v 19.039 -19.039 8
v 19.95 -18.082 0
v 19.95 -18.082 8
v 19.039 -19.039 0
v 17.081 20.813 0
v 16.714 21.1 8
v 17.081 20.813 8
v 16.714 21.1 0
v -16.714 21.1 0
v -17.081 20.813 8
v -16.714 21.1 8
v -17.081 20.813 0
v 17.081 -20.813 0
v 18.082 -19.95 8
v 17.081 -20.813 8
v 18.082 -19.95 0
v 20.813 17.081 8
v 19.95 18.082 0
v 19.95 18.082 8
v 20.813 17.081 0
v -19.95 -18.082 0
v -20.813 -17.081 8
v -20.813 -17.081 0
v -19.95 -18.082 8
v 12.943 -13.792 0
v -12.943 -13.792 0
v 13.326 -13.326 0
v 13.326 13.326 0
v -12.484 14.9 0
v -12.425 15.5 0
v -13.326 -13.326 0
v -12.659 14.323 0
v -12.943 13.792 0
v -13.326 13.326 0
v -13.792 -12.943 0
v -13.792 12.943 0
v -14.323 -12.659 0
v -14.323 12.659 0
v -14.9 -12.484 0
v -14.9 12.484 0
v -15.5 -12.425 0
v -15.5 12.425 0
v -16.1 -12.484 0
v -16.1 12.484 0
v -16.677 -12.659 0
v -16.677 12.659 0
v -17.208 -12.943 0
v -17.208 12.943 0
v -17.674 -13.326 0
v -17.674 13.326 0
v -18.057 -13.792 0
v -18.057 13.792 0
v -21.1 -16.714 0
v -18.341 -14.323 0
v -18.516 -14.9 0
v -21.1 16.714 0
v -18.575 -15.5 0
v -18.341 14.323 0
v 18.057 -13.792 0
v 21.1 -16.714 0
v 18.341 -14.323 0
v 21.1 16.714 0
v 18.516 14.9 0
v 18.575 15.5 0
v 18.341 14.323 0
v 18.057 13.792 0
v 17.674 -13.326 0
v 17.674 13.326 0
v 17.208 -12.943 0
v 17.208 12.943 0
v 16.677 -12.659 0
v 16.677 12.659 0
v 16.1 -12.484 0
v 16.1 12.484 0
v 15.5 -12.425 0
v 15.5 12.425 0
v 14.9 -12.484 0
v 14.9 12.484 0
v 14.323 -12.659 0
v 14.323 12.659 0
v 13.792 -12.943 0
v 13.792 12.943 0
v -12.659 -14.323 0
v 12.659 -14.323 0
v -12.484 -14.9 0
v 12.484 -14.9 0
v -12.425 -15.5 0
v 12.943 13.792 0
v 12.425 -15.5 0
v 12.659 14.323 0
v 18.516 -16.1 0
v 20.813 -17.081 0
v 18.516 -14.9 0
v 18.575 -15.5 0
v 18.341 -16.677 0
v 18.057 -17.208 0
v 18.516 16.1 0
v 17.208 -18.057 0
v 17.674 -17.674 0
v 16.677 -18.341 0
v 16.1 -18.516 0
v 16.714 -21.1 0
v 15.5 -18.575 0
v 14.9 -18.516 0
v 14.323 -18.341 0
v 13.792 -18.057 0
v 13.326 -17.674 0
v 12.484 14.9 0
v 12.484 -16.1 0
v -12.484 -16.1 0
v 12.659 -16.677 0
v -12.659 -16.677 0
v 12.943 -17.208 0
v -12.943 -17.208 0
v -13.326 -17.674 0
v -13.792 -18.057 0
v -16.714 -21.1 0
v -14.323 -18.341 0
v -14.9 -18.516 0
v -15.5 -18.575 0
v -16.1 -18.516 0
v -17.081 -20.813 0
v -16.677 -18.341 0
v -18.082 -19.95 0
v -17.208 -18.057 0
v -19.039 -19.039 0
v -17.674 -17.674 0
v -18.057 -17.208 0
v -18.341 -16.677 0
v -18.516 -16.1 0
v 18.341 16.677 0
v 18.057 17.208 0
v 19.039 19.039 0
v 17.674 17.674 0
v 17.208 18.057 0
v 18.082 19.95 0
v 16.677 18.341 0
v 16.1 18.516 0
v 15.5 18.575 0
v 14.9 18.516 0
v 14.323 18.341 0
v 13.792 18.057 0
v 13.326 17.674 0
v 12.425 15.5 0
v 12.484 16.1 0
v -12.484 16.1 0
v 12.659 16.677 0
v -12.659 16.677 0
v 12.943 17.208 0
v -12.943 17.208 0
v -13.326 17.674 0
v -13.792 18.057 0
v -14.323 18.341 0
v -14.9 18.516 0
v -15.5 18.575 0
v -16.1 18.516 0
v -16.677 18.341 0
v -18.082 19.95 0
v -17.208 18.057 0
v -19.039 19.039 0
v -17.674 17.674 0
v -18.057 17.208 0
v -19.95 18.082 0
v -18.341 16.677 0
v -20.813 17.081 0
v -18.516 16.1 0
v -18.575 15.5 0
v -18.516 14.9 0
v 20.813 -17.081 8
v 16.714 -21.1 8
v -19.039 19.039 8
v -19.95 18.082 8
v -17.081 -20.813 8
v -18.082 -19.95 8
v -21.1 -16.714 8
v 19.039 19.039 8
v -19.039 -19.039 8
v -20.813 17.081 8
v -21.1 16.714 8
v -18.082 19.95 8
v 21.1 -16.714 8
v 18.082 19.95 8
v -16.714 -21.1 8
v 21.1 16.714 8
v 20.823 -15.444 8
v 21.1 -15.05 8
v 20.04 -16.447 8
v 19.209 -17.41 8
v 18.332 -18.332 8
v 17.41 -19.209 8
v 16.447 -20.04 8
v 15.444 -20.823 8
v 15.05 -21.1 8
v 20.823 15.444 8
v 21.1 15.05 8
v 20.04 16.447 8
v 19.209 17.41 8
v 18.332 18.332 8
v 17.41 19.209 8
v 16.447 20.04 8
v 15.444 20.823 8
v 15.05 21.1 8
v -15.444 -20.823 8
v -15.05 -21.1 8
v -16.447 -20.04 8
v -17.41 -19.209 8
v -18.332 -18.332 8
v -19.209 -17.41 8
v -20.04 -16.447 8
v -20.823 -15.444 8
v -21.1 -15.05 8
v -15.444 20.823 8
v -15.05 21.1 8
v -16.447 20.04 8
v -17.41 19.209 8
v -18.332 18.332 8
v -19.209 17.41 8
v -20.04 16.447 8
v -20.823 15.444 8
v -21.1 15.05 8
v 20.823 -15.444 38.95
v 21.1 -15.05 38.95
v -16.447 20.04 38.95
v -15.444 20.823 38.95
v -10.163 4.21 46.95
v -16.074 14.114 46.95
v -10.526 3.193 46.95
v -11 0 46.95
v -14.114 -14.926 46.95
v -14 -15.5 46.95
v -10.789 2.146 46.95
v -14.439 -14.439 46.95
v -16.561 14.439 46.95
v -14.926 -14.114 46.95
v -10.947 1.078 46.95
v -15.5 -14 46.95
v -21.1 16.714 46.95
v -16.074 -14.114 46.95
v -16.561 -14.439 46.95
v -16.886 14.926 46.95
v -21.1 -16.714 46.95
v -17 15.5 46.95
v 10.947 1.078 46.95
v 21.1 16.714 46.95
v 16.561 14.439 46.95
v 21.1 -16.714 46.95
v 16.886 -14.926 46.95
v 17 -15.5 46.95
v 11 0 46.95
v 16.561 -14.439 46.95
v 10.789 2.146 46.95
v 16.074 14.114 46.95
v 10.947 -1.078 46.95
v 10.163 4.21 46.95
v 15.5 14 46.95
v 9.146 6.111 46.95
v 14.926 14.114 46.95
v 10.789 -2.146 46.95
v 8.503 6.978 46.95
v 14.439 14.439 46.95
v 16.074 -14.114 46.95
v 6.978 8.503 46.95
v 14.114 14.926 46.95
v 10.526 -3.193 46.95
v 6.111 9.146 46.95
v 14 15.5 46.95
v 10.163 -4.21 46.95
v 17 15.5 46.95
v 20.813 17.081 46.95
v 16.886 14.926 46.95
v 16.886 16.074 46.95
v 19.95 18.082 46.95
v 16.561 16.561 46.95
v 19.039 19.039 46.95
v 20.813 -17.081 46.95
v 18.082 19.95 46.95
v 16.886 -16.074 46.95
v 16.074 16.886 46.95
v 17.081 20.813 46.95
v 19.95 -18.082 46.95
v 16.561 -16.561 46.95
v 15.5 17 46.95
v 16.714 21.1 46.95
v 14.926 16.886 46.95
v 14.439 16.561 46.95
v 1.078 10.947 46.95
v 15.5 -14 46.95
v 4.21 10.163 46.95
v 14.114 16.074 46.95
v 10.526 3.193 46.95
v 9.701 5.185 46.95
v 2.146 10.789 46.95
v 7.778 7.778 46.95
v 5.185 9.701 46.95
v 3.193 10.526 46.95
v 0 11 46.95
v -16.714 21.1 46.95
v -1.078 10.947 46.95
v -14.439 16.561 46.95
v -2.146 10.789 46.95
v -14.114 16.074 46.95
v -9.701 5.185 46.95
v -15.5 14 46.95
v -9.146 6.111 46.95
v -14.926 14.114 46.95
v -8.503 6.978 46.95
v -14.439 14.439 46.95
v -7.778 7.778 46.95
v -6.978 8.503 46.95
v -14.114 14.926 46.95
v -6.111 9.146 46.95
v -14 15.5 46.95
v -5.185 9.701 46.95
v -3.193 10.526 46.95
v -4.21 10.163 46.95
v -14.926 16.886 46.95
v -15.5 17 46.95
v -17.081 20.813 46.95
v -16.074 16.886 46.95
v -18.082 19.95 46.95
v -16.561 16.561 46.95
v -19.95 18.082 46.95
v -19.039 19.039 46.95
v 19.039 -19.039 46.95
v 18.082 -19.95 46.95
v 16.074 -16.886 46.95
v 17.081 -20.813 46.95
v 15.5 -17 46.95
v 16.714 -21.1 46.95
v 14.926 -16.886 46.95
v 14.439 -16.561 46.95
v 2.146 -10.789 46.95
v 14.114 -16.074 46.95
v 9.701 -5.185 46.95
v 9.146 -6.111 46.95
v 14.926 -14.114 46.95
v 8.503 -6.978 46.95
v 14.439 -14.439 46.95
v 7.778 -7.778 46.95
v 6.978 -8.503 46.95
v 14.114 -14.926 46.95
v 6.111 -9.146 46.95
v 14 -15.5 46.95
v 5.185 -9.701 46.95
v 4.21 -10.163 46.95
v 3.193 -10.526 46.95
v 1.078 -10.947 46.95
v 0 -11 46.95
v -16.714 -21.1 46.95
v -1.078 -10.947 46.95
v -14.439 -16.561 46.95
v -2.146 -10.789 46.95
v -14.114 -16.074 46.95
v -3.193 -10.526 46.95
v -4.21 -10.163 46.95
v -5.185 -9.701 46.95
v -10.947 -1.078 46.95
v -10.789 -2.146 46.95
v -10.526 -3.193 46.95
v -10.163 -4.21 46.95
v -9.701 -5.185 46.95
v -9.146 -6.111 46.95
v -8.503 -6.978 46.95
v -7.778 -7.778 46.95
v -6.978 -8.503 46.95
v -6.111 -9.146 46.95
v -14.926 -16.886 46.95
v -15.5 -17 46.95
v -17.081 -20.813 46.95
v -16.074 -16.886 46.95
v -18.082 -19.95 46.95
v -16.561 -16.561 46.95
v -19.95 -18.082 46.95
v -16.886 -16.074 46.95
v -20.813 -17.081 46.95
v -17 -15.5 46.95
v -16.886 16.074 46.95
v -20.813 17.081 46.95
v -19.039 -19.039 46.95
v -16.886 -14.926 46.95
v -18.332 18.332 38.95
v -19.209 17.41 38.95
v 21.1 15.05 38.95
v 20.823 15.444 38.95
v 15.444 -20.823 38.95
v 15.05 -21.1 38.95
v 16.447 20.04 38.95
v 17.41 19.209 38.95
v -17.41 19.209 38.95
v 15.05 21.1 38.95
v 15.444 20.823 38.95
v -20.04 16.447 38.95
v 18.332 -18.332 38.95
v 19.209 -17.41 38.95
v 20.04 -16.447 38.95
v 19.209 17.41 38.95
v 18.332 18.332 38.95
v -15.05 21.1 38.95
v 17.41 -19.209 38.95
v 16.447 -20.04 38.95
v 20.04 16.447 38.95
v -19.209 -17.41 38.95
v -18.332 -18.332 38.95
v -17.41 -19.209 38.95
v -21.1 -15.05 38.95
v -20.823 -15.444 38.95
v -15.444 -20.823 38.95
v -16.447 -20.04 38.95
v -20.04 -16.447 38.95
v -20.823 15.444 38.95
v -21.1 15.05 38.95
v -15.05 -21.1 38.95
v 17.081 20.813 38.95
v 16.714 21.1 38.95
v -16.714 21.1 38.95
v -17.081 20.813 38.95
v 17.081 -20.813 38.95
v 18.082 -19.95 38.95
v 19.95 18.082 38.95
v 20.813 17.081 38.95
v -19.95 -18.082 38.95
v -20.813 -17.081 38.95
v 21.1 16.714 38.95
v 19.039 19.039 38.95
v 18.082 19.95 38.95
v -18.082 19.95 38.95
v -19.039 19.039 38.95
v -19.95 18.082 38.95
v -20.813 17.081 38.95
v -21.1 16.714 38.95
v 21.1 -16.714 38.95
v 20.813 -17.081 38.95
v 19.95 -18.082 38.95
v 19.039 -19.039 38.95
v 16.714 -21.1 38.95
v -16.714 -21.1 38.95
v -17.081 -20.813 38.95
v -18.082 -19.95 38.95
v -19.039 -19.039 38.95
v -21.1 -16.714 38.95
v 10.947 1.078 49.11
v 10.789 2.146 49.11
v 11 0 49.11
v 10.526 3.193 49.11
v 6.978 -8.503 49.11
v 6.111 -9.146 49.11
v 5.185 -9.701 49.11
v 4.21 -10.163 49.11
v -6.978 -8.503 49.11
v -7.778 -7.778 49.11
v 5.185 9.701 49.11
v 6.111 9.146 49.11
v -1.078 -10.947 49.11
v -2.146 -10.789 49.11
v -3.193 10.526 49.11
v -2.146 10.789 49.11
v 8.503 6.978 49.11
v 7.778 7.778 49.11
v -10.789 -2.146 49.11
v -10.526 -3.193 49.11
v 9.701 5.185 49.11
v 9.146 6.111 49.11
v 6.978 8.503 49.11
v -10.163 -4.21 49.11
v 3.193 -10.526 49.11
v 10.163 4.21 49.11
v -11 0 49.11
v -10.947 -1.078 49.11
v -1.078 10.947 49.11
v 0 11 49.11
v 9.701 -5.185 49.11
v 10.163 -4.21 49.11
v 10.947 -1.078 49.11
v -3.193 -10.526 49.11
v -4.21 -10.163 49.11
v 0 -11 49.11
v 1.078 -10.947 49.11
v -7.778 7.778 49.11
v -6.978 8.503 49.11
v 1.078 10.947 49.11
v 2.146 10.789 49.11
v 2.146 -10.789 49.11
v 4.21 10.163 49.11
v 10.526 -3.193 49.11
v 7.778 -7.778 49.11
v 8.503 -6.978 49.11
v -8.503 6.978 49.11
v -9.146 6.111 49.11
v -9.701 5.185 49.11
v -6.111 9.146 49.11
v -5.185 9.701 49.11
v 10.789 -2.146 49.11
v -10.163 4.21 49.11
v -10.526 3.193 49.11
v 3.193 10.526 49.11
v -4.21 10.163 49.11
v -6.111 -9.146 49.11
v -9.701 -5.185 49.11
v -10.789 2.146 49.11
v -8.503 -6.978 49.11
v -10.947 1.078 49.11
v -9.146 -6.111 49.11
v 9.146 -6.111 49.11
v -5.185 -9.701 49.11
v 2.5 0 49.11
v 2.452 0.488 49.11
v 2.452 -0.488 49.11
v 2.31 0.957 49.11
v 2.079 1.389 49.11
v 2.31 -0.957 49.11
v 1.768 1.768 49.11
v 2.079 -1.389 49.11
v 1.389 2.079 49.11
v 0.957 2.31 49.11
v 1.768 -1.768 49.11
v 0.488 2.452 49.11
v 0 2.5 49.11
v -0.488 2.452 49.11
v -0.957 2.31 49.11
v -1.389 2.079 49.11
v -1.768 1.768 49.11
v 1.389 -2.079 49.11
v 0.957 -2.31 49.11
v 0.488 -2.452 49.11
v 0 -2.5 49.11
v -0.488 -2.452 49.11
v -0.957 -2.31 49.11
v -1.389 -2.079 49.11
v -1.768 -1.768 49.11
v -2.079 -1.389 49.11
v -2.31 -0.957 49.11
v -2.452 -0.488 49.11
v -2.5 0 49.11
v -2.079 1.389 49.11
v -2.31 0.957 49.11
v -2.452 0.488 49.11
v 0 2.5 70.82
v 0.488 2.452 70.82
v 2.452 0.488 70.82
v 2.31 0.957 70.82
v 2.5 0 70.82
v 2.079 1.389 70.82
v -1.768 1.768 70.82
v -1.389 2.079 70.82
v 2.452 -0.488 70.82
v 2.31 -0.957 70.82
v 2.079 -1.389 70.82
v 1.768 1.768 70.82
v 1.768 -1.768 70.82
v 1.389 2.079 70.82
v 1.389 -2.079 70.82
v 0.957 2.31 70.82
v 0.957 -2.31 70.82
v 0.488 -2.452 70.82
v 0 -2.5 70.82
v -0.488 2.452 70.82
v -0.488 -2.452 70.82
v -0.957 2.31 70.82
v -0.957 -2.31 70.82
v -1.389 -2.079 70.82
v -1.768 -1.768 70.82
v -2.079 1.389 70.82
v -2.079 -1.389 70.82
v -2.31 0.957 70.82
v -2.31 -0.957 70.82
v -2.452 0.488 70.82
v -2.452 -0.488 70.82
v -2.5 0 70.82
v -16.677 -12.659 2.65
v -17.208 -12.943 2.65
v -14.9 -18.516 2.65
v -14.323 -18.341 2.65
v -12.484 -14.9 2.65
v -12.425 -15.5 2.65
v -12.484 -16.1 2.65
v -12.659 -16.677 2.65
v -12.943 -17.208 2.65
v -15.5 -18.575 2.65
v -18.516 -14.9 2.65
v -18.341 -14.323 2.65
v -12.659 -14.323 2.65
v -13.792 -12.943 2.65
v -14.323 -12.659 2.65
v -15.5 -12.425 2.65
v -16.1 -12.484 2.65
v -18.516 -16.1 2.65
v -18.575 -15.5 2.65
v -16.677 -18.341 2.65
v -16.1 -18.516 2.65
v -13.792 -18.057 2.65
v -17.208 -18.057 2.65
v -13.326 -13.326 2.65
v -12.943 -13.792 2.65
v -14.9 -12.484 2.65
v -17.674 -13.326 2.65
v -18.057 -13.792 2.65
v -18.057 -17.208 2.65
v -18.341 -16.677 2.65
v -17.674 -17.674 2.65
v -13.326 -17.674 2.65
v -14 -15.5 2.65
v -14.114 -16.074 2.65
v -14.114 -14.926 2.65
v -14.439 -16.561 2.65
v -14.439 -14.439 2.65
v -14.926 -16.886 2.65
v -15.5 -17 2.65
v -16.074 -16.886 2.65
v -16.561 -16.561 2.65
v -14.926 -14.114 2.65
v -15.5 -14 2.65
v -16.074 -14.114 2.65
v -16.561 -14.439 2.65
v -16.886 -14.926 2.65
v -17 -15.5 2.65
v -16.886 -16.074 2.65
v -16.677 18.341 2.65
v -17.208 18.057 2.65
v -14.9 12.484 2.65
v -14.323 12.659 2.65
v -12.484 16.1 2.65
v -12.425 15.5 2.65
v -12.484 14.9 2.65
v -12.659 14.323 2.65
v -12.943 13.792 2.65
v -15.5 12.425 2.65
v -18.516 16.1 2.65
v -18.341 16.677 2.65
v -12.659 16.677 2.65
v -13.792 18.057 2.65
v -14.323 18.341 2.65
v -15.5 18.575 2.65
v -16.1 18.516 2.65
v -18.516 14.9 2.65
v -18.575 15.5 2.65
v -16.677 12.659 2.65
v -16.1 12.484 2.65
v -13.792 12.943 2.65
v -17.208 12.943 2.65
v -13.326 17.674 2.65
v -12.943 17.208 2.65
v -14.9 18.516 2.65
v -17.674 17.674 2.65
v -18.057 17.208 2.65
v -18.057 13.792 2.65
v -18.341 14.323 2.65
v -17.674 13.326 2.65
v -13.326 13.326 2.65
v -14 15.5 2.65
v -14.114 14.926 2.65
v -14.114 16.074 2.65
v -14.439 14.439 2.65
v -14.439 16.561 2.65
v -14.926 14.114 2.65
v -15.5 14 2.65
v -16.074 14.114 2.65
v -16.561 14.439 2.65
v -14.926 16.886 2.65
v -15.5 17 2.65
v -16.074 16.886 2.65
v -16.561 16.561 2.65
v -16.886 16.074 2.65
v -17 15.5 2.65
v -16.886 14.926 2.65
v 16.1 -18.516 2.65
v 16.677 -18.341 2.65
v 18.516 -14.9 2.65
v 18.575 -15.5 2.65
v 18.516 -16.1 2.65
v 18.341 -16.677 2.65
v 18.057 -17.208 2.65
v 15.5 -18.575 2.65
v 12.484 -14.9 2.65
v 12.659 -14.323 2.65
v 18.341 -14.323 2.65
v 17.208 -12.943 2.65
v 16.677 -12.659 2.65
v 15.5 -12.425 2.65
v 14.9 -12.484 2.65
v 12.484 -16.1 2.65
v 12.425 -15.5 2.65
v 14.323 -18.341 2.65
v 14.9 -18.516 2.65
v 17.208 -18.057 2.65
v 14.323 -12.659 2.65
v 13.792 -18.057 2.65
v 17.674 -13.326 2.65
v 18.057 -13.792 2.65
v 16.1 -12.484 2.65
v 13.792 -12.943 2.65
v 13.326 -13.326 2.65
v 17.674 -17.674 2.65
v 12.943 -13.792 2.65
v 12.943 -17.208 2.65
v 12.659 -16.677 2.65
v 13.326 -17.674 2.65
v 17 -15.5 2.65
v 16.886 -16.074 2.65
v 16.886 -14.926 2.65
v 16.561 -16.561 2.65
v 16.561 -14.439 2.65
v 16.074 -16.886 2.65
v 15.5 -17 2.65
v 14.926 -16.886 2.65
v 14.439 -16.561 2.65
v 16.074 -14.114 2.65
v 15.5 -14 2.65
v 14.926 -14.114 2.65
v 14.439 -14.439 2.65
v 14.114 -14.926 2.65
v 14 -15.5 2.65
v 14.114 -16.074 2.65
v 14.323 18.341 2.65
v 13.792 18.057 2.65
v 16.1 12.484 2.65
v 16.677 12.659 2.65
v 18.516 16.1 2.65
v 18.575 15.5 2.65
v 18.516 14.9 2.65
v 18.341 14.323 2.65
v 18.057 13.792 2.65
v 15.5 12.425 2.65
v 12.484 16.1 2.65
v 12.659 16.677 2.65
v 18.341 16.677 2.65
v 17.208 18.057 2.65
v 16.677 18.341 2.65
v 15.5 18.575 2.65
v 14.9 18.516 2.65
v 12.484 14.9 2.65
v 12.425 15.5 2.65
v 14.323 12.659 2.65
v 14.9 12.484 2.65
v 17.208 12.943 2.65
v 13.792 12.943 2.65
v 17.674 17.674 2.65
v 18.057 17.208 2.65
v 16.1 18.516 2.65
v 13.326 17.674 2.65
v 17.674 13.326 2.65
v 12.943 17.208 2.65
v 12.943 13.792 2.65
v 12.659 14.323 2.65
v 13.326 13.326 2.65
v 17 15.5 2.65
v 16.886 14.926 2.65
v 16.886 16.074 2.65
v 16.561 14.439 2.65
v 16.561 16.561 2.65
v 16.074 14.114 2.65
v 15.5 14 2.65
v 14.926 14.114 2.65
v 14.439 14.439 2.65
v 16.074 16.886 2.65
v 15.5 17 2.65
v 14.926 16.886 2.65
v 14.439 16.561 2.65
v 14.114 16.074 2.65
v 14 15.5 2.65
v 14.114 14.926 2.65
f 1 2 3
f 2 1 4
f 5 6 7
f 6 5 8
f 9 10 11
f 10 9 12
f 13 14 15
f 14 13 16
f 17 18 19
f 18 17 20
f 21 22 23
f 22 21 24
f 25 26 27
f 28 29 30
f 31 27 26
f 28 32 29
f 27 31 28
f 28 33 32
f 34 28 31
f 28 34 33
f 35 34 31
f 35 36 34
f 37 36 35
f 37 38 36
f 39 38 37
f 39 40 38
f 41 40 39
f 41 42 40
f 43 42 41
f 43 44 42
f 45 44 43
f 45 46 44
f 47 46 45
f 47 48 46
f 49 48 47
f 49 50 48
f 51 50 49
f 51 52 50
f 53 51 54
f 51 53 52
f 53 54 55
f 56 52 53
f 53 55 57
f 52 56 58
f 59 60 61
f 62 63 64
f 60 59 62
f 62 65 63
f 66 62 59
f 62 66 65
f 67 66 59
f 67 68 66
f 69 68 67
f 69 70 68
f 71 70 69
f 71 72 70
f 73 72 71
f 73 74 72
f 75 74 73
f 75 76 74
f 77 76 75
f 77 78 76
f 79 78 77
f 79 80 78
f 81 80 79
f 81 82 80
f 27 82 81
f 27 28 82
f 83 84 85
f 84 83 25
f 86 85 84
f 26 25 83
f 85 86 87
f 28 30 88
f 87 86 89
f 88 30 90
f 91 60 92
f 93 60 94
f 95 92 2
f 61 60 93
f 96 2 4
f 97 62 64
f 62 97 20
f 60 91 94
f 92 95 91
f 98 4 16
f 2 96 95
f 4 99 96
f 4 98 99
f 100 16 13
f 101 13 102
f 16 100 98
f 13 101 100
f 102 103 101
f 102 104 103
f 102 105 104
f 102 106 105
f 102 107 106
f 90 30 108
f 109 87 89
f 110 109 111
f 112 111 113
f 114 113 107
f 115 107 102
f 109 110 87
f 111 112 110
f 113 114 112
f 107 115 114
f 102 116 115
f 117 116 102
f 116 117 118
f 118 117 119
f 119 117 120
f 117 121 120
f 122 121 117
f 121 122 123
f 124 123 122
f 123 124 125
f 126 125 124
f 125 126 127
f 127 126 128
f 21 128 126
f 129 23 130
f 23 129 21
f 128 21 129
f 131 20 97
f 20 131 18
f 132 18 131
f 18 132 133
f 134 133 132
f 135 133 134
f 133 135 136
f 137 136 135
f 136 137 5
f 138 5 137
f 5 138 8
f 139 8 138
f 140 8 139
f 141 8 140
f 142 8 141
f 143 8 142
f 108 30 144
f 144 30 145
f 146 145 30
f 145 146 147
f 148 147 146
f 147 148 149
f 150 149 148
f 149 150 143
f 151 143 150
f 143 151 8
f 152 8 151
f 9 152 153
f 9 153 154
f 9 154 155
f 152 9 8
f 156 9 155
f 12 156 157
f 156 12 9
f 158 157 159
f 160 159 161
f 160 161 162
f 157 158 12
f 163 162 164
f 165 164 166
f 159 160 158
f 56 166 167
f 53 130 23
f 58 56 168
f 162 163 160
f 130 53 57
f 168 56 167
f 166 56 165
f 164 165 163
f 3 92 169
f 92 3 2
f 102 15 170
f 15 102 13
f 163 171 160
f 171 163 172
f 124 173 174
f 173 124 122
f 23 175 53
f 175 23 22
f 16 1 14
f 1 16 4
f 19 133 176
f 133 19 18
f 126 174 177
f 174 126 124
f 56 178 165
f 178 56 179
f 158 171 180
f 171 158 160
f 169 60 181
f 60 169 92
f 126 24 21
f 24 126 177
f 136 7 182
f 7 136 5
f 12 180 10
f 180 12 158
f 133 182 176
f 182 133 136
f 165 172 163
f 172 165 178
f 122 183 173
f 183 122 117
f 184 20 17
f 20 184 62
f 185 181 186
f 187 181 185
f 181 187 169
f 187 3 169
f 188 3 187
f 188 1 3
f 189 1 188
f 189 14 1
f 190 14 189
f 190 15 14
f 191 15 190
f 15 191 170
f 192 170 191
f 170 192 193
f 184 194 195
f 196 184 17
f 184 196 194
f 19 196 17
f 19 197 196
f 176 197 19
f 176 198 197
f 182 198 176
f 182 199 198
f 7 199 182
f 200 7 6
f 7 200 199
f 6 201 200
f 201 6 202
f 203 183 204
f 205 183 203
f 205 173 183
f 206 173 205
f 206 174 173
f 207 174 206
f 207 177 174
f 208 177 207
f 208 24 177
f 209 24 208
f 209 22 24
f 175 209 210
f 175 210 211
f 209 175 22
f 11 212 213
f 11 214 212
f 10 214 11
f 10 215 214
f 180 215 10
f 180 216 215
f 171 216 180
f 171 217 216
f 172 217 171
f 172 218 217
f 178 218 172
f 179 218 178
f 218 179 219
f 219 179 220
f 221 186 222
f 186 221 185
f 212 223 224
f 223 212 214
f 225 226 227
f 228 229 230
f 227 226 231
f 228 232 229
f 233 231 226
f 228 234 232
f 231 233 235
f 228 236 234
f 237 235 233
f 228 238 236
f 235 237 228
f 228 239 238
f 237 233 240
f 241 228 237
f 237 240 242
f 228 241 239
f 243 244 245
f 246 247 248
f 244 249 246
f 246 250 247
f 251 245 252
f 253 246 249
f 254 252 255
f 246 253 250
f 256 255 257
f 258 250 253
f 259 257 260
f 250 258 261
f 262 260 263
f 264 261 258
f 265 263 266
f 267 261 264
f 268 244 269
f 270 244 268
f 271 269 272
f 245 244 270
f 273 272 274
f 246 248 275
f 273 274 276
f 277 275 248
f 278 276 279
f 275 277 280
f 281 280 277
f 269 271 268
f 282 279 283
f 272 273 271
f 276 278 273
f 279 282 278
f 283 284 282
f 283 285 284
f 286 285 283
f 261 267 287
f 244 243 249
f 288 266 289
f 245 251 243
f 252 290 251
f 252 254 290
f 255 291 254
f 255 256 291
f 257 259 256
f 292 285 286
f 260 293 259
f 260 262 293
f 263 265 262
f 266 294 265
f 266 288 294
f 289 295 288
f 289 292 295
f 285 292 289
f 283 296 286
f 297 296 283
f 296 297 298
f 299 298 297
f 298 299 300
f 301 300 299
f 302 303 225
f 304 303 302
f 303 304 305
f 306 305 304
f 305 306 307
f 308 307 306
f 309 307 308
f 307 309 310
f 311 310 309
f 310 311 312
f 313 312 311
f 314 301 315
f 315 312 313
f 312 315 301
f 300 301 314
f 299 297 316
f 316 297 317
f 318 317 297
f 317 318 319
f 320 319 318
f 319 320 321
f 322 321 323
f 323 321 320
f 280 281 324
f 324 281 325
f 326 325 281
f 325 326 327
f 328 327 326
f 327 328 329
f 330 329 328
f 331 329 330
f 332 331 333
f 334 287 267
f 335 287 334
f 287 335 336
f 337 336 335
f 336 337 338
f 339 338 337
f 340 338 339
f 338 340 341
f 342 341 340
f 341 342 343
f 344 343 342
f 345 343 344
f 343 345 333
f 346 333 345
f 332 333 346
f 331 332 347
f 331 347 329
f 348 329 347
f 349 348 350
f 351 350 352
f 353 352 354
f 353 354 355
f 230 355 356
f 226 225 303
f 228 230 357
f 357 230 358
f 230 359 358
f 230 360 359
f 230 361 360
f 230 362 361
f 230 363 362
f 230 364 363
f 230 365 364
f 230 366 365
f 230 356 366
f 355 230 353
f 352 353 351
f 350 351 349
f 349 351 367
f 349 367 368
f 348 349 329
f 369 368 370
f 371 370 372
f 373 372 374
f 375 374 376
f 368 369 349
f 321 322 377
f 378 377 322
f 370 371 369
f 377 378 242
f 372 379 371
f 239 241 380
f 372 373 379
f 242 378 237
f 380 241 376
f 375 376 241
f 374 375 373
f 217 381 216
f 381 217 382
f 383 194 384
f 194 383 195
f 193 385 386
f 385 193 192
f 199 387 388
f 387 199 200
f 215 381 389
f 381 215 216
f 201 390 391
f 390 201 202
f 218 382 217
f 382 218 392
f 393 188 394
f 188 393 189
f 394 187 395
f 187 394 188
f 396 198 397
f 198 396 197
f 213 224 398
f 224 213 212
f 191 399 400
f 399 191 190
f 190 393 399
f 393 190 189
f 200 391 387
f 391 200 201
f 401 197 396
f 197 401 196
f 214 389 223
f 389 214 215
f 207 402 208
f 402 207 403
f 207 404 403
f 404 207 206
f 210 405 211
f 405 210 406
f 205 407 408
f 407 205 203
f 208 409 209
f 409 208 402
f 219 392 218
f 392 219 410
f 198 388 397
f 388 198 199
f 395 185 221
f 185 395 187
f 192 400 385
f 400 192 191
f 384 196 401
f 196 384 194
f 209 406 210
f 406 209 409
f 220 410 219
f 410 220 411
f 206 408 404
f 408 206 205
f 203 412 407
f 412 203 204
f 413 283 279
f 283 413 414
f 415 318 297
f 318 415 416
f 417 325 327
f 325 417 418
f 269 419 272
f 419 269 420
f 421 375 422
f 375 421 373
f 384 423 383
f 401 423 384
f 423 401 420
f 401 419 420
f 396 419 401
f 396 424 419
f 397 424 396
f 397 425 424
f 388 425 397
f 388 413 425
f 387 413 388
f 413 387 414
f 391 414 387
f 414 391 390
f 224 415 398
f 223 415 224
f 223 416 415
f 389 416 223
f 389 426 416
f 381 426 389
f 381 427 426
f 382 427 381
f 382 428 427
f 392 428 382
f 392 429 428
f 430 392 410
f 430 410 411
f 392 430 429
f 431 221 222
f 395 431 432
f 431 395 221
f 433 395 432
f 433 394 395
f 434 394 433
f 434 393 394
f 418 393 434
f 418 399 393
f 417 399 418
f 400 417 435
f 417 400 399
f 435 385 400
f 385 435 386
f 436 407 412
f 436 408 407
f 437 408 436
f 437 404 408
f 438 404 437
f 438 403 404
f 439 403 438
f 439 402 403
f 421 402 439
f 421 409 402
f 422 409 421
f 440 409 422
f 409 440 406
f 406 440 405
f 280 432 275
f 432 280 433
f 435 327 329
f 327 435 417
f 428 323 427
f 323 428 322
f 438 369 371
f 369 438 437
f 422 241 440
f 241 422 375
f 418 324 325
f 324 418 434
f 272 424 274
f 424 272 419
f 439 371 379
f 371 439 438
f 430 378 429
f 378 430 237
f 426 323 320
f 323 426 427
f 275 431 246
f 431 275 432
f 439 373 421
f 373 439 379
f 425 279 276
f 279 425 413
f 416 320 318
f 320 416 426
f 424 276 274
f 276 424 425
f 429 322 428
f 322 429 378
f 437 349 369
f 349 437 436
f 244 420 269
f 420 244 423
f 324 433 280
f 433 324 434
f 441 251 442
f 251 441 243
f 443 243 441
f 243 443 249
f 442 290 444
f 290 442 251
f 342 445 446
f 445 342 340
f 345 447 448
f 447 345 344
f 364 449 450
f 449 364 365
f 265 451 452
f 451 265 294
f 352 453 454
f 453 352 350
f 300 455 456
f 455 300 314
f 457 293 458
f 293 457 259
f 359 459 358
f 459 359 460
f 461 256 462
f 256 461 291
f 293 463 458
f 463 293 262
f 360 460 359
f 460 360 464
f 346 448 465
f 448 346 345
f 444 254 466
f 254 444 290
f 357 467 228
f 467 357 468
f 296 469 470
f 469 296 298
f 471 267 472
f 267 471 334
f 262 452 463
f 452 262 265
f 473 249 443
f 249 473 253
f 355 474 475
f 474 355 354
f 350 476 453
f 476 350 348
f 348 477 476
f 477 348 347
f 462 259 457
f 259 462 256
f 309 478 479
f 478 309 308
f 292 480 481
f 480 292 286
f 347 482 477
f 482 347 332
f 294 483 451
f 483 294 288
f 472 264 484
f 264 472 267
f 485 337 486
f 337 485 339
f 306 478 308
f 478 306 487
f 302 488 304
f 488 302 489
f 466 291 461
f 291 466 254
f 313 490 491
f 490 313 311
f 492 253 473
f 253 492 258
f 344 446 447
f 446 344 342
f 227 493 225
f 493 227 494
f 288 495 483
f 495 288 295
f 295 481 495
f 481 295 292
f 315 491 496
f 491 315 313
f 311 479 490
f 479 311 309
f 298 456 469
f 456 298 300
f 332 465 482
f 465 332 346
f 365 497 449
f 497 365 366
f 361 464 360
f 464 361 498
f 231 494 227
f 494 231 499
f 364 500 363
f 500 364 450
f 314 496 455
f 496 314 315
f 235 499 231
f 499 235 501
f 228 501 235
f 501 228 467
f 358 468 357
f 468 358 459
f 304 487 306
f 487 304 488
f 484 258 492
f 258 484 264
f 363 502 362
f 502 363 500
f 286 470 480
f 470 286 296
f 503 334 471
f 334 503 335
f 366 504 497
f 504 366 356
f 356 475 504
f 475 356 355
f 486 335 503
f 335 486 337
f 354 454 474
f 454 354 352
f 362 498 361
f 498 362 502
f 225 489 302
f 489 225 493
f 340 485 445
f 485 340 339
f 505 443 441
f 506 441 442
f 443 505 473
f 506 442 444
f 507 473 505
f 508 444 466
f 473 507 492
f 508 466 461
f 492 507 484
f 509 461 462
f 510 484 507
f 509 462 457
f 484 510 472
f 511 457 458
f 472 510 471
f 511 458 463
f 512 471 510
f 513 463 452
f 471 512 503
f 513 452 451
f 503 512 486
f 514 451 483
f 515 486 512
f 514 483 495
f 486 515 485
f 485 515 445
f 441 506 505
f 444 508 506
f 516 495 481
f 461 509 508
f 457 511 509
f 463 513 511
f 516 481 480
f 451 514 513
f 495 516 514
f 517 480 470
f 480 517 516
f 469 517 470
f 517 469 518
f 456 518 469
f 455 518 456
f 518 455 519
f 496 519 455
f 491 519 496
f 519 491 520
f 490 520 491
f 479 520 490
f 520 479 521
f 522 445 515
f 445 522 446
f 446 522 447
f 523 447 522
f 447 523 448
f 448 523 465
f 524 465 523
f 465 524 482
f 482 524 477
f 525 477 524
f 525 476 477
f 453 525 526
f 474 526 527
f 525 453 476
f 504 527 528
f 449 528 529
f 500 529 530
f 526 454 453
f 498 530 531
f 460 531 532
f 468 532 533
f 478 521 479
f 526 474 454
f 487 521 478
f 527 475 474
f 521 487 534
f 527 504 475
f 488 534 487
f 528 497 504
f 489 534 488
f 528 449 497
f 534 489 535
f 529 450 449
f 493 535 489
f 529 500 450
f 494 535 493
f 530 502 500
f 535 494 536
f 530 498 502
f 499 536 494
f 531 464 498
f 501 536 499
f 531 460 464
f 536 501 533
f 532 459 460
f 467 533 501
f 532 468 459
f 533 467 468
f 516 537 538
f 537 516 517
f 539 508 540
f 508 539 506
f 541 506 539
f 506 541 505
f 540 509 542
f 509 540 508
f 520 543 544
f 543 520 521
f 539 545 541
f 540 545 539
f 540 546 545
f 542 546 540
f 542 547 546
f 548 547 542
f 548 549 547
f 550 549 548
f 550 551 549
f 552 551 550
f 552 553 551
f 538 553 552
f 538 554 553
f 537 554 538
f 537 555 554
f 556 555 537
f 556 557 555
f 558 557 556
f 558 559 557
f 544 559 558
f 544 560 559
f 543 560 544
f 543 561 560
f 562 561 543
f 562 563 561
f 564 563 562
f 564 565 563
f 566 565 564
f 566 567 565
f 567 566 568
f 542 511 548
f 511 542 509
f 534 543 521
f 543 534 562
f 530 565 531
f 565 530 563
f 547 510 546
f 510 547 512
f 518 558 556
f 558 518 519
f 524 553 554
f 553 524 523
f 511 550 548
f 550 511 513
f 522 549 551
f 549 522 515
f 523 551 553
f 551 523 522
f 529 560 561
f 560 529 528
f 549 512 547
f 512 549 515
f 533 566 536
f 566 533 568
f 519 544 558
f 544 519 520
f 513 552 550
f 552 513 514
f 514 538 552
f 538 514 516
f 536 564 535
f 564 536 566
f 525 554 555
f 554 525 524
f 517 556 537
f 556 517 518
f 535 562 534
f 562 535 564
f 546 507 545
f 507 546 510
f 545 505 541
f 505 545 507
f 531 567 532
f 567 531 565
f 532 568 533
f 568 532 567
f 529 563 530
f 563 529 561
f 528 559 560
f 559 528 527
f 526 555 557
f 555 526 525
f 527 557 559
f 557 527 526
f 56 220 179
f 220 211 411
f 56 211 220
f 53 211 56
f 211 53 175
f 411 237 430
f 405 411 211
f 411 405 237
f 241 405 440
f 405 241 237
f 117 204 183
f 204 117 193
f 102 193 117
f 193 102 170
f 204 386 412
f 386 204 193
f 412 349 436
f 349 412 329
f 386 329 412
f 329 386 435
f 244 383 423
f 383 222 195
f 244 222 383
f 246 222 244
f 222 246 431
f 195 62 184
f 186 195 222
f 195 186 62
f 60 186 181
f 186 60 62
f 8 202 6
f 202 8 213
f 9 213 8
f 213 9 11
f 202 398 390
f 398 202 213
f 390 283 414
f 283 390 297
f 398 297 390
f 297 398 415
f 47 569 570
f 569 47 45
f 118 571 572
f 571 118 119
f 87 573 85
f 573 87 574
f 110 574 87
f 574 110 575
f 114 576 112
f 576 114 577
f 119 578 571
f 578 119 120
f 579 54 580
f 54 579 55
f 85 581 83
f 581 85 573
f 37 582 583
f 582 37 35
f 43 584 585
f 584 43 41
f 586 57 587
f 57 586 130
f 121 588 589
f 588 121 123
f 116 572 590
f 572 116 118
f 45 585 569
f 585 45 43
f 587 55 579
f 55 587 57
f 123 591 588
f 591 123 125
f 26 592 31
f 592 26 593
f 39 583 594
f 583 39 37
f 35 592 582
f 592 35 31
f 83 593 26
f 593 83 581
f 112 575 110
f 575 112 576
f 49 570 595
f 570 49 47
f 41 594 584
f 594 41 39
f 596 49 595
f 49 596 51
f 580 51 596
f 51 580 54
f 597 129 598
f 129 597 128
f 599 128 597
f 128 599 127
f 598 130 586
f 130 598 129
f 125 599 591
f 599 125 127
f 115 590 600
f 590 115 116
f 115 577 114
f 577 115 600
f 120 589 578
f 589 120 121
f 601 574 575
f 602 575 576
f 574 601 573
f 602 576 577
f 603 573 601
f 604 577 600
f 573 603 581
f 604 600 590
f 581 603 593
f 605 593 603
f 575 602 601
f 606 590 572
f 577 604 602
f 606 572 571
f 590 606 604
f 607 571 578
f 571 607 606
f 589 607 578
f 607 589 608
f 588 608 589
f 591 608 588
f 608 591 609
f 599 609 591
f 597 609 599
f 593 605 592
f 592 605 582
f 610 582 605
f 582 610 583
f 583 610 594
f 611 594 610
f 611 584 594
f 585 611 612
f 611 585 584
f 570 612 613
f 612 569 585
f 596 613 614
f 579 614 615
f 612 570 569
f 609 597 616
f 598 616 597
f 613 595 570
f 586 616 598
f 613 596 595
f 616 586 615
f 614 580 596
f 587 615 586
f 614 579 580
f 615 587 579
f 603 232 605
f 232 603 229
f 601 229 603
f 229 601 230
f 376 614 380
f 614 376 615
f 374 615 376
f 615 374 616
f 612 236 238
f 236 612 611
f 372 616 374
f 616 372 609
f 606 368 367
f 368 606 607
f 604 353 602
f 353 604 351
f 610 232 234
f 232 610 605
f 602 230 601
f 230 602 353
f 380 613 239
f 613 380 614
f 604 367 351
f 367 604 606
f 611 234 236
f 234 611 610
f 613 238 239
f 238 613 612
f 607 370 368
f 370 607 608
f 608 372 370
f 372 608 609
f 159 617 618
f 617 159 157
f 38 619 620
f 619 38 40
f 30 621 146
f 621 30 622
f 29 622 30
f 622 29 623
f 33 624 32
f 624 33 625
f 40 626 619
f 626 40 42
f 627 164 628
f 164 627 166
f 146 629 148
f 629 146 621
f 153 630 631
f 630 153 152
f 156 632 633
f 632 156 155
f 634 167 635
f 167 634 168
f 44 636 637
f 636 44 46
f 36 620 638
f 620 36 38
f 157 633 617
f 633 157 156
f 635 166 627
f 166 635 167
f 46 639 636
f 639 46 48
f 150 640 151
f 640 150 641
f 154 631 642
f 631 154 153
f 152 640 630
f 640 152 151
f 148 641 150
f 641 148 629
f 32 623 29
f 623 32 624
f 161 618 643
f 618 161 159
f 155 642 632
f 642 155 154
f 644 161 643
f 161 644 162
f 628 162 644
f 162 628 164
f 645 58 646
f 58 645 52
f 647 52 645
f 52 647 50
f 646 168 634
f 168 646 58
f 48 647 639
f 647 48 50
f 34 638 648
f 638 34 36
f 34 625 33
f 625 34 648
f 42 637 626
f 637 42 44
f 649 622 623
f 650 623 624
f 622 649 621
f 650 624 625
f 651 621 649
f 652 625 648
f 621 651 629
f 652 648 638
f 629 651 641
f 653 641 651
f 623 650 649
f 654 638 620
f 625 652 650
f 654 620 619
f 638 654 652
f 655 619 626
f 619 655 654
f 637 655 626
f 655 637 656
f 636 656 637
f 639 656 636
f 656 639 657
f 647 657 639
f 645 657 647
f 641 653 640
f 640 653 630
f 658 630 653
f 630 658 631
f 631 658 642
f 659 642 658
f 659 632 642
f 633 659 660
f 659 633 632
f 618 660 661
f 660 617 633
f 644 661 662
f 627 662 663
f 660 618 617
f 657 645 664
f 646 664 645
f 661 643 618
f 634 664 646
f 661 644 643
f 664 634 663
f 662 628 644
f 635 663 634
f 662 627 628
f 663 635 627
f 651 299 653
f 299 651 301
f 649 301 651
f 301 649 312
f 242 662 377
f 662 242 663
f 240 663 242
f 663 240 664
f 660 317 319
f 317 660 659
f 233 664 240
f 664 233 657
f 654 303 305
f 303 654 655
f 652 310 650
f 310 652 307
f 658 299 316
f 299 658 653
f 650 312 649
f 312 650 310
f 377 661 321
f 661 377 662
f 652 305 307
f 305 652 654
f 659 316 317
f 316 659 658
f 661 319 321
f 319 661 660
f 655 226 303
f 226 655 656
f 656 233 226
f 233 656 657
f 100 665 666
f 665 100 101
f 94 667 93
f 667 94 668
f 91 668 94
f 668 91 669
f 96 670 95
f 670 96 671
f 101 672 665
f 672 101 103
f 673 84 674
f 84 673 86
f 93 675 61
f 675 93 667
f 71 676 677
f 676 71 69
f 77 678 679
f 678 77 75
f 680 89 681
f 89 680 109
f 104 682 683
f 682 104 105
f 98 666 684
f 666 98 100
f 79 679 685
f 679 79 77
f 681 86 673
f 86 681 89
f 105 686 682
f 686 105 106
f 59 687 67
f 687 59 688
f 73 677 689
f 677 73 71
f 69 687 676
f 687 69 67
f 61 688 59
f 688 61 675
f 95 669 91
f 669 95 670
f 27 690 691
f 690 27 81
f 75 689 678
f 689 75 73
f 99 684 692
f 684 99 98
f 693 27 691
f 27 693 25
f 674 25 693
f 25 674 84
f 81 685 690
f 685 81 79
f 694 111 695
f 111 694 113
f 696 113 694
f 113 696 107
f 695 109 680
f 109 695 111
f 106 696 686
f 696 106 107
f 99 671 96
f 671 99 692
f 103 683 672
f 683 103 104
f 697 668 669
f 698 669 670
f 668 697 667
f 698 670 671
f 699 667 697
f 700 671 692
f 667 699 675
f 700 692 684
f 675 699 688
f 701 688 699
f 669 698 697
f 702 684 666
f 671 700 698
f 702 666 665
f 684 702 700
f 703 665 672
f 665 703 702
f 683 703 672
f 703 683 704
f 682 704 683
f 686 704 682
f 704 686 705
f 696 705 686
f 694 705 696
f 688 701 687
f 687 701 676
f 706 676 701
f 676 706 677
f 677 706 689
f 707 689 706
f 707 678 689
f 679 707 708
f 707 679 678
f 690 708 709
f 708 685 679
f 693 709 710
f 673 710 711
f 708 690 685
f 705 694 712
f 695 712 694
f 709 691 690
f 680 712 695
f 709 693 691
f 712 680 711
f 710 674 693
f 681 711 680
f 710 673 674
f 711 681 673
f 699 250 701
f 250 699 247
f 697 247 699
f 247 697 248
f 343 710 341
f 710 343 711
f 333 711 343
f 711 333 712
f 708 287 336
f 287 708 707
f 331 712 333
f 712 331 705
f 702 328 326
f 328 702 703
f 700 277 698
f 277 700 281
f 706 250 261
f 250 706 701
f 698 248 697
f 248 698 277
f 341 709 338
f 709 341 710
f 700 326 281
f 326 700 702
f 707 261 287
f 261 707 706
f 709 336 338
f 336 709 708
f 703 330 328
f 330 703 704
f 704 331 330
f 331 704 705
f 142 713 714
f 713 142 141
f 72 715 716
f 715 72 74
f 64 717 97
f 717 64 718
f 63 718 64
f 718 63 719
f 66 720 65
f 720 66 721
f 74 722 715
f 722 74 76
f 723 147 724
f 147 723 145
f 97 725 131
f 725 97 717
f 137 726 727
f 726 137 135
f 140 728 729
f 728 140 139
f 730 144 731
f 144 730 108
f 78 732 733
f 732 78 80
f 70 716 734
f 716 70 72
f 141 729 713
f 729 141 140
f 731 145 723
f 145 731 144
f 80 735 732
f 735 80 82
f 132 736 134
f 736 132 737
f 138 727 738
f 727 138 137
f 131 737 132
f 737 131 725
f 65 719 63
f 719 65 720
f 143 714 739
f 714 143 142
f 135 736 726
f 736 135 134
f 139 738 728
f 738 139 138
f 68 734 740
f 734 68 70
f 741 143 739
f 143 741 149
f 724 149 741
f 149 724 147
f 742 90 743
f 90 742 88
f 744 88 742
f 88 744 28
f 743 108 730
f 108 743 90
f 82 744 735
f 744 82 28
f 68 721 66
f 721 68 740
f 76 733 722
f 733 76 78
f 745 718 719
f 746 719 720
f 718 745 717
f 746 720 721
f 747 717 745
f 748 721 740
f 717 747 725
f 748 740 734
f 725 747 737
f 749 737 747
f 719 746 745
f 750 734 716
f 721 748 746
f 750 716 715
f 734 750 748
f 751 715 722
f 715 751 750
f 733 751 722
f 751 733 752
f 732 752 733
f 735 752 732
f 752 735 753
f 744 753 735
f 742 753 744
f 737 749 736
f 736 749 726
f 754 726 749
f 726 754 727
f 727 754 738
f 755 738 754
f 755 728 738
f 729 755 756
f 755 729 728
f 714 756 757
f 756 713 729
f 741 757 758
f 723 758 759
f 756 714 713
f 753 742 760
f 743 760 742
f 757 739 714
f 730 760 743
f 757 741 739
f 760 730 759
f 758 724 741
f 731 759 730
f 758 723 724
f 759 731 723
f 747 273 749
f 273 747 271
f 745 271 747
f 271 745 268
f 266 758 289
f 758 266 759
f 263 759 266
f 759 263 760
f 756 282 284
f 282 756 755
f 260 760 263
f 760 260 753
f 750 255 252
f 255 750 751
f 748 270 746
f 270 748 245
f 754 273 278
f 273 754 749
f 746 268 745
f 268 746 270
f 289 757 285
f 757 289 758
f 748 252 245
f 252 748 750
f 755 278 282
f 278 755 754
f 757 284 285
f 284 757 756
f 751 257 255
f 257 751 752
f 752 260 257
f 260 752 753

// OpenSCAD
module Nema17() {
    holeDistance = 31;
    width = 42.2;
    height = 46.95;
    diagonal = 53.85;
    raisedCylinderDiameter = 22;
    raisedCylinderHeight = 2.16;
    screwHoleDepth = 2.65;
    screwHoleDiameter = 6.15;
    screwDiameter = 3;
    diameter = 5;
    fullHeight = 70.82;
    rimHeight = 8;

    color("Cyan") render(convexity=4) difference() {
        union() {
            cylinder(d=diagonal, h=rimHeight, $fn=128);
            cylinder(d=diagonal-2, h=height, $fn=128);
            translate([0, 0, height-rimHeight]) {
                cylinder(d=diagonal, h=rimHeight, $fn=128);
            }
            translate([0, 0, height]) {
                cylinder(d=raisedCylinderDiameter, h=raisedCylinderHeight, $fn=64);
            }
            color("Cyan") {
                cylinder(d=diameter, h=fullHeight, $fn=32);
            }
        }
        for(i = [-3, 1]) {
            translate([i*width/2, -width/2, -1]) {
                cube([width, width, height+2]);
            }
            translate([-width/2, i*width/2, -1]) {
                cube([width, width, height+2]);
            }
        }
        for(x = [-1, 1]) {
            for(y = [-1, 1]) {
                translate([x*holeDistance/2, y*holeDistance/2, -1]) {
                    cylinder(d=screwHoleDiameter, h=screwHoleDepth+1, $fn=32);
                    cylinder(d=screwDiameter, h=height+2, $fn=16);
                }
            }
        }
    }
}
Nema17();
